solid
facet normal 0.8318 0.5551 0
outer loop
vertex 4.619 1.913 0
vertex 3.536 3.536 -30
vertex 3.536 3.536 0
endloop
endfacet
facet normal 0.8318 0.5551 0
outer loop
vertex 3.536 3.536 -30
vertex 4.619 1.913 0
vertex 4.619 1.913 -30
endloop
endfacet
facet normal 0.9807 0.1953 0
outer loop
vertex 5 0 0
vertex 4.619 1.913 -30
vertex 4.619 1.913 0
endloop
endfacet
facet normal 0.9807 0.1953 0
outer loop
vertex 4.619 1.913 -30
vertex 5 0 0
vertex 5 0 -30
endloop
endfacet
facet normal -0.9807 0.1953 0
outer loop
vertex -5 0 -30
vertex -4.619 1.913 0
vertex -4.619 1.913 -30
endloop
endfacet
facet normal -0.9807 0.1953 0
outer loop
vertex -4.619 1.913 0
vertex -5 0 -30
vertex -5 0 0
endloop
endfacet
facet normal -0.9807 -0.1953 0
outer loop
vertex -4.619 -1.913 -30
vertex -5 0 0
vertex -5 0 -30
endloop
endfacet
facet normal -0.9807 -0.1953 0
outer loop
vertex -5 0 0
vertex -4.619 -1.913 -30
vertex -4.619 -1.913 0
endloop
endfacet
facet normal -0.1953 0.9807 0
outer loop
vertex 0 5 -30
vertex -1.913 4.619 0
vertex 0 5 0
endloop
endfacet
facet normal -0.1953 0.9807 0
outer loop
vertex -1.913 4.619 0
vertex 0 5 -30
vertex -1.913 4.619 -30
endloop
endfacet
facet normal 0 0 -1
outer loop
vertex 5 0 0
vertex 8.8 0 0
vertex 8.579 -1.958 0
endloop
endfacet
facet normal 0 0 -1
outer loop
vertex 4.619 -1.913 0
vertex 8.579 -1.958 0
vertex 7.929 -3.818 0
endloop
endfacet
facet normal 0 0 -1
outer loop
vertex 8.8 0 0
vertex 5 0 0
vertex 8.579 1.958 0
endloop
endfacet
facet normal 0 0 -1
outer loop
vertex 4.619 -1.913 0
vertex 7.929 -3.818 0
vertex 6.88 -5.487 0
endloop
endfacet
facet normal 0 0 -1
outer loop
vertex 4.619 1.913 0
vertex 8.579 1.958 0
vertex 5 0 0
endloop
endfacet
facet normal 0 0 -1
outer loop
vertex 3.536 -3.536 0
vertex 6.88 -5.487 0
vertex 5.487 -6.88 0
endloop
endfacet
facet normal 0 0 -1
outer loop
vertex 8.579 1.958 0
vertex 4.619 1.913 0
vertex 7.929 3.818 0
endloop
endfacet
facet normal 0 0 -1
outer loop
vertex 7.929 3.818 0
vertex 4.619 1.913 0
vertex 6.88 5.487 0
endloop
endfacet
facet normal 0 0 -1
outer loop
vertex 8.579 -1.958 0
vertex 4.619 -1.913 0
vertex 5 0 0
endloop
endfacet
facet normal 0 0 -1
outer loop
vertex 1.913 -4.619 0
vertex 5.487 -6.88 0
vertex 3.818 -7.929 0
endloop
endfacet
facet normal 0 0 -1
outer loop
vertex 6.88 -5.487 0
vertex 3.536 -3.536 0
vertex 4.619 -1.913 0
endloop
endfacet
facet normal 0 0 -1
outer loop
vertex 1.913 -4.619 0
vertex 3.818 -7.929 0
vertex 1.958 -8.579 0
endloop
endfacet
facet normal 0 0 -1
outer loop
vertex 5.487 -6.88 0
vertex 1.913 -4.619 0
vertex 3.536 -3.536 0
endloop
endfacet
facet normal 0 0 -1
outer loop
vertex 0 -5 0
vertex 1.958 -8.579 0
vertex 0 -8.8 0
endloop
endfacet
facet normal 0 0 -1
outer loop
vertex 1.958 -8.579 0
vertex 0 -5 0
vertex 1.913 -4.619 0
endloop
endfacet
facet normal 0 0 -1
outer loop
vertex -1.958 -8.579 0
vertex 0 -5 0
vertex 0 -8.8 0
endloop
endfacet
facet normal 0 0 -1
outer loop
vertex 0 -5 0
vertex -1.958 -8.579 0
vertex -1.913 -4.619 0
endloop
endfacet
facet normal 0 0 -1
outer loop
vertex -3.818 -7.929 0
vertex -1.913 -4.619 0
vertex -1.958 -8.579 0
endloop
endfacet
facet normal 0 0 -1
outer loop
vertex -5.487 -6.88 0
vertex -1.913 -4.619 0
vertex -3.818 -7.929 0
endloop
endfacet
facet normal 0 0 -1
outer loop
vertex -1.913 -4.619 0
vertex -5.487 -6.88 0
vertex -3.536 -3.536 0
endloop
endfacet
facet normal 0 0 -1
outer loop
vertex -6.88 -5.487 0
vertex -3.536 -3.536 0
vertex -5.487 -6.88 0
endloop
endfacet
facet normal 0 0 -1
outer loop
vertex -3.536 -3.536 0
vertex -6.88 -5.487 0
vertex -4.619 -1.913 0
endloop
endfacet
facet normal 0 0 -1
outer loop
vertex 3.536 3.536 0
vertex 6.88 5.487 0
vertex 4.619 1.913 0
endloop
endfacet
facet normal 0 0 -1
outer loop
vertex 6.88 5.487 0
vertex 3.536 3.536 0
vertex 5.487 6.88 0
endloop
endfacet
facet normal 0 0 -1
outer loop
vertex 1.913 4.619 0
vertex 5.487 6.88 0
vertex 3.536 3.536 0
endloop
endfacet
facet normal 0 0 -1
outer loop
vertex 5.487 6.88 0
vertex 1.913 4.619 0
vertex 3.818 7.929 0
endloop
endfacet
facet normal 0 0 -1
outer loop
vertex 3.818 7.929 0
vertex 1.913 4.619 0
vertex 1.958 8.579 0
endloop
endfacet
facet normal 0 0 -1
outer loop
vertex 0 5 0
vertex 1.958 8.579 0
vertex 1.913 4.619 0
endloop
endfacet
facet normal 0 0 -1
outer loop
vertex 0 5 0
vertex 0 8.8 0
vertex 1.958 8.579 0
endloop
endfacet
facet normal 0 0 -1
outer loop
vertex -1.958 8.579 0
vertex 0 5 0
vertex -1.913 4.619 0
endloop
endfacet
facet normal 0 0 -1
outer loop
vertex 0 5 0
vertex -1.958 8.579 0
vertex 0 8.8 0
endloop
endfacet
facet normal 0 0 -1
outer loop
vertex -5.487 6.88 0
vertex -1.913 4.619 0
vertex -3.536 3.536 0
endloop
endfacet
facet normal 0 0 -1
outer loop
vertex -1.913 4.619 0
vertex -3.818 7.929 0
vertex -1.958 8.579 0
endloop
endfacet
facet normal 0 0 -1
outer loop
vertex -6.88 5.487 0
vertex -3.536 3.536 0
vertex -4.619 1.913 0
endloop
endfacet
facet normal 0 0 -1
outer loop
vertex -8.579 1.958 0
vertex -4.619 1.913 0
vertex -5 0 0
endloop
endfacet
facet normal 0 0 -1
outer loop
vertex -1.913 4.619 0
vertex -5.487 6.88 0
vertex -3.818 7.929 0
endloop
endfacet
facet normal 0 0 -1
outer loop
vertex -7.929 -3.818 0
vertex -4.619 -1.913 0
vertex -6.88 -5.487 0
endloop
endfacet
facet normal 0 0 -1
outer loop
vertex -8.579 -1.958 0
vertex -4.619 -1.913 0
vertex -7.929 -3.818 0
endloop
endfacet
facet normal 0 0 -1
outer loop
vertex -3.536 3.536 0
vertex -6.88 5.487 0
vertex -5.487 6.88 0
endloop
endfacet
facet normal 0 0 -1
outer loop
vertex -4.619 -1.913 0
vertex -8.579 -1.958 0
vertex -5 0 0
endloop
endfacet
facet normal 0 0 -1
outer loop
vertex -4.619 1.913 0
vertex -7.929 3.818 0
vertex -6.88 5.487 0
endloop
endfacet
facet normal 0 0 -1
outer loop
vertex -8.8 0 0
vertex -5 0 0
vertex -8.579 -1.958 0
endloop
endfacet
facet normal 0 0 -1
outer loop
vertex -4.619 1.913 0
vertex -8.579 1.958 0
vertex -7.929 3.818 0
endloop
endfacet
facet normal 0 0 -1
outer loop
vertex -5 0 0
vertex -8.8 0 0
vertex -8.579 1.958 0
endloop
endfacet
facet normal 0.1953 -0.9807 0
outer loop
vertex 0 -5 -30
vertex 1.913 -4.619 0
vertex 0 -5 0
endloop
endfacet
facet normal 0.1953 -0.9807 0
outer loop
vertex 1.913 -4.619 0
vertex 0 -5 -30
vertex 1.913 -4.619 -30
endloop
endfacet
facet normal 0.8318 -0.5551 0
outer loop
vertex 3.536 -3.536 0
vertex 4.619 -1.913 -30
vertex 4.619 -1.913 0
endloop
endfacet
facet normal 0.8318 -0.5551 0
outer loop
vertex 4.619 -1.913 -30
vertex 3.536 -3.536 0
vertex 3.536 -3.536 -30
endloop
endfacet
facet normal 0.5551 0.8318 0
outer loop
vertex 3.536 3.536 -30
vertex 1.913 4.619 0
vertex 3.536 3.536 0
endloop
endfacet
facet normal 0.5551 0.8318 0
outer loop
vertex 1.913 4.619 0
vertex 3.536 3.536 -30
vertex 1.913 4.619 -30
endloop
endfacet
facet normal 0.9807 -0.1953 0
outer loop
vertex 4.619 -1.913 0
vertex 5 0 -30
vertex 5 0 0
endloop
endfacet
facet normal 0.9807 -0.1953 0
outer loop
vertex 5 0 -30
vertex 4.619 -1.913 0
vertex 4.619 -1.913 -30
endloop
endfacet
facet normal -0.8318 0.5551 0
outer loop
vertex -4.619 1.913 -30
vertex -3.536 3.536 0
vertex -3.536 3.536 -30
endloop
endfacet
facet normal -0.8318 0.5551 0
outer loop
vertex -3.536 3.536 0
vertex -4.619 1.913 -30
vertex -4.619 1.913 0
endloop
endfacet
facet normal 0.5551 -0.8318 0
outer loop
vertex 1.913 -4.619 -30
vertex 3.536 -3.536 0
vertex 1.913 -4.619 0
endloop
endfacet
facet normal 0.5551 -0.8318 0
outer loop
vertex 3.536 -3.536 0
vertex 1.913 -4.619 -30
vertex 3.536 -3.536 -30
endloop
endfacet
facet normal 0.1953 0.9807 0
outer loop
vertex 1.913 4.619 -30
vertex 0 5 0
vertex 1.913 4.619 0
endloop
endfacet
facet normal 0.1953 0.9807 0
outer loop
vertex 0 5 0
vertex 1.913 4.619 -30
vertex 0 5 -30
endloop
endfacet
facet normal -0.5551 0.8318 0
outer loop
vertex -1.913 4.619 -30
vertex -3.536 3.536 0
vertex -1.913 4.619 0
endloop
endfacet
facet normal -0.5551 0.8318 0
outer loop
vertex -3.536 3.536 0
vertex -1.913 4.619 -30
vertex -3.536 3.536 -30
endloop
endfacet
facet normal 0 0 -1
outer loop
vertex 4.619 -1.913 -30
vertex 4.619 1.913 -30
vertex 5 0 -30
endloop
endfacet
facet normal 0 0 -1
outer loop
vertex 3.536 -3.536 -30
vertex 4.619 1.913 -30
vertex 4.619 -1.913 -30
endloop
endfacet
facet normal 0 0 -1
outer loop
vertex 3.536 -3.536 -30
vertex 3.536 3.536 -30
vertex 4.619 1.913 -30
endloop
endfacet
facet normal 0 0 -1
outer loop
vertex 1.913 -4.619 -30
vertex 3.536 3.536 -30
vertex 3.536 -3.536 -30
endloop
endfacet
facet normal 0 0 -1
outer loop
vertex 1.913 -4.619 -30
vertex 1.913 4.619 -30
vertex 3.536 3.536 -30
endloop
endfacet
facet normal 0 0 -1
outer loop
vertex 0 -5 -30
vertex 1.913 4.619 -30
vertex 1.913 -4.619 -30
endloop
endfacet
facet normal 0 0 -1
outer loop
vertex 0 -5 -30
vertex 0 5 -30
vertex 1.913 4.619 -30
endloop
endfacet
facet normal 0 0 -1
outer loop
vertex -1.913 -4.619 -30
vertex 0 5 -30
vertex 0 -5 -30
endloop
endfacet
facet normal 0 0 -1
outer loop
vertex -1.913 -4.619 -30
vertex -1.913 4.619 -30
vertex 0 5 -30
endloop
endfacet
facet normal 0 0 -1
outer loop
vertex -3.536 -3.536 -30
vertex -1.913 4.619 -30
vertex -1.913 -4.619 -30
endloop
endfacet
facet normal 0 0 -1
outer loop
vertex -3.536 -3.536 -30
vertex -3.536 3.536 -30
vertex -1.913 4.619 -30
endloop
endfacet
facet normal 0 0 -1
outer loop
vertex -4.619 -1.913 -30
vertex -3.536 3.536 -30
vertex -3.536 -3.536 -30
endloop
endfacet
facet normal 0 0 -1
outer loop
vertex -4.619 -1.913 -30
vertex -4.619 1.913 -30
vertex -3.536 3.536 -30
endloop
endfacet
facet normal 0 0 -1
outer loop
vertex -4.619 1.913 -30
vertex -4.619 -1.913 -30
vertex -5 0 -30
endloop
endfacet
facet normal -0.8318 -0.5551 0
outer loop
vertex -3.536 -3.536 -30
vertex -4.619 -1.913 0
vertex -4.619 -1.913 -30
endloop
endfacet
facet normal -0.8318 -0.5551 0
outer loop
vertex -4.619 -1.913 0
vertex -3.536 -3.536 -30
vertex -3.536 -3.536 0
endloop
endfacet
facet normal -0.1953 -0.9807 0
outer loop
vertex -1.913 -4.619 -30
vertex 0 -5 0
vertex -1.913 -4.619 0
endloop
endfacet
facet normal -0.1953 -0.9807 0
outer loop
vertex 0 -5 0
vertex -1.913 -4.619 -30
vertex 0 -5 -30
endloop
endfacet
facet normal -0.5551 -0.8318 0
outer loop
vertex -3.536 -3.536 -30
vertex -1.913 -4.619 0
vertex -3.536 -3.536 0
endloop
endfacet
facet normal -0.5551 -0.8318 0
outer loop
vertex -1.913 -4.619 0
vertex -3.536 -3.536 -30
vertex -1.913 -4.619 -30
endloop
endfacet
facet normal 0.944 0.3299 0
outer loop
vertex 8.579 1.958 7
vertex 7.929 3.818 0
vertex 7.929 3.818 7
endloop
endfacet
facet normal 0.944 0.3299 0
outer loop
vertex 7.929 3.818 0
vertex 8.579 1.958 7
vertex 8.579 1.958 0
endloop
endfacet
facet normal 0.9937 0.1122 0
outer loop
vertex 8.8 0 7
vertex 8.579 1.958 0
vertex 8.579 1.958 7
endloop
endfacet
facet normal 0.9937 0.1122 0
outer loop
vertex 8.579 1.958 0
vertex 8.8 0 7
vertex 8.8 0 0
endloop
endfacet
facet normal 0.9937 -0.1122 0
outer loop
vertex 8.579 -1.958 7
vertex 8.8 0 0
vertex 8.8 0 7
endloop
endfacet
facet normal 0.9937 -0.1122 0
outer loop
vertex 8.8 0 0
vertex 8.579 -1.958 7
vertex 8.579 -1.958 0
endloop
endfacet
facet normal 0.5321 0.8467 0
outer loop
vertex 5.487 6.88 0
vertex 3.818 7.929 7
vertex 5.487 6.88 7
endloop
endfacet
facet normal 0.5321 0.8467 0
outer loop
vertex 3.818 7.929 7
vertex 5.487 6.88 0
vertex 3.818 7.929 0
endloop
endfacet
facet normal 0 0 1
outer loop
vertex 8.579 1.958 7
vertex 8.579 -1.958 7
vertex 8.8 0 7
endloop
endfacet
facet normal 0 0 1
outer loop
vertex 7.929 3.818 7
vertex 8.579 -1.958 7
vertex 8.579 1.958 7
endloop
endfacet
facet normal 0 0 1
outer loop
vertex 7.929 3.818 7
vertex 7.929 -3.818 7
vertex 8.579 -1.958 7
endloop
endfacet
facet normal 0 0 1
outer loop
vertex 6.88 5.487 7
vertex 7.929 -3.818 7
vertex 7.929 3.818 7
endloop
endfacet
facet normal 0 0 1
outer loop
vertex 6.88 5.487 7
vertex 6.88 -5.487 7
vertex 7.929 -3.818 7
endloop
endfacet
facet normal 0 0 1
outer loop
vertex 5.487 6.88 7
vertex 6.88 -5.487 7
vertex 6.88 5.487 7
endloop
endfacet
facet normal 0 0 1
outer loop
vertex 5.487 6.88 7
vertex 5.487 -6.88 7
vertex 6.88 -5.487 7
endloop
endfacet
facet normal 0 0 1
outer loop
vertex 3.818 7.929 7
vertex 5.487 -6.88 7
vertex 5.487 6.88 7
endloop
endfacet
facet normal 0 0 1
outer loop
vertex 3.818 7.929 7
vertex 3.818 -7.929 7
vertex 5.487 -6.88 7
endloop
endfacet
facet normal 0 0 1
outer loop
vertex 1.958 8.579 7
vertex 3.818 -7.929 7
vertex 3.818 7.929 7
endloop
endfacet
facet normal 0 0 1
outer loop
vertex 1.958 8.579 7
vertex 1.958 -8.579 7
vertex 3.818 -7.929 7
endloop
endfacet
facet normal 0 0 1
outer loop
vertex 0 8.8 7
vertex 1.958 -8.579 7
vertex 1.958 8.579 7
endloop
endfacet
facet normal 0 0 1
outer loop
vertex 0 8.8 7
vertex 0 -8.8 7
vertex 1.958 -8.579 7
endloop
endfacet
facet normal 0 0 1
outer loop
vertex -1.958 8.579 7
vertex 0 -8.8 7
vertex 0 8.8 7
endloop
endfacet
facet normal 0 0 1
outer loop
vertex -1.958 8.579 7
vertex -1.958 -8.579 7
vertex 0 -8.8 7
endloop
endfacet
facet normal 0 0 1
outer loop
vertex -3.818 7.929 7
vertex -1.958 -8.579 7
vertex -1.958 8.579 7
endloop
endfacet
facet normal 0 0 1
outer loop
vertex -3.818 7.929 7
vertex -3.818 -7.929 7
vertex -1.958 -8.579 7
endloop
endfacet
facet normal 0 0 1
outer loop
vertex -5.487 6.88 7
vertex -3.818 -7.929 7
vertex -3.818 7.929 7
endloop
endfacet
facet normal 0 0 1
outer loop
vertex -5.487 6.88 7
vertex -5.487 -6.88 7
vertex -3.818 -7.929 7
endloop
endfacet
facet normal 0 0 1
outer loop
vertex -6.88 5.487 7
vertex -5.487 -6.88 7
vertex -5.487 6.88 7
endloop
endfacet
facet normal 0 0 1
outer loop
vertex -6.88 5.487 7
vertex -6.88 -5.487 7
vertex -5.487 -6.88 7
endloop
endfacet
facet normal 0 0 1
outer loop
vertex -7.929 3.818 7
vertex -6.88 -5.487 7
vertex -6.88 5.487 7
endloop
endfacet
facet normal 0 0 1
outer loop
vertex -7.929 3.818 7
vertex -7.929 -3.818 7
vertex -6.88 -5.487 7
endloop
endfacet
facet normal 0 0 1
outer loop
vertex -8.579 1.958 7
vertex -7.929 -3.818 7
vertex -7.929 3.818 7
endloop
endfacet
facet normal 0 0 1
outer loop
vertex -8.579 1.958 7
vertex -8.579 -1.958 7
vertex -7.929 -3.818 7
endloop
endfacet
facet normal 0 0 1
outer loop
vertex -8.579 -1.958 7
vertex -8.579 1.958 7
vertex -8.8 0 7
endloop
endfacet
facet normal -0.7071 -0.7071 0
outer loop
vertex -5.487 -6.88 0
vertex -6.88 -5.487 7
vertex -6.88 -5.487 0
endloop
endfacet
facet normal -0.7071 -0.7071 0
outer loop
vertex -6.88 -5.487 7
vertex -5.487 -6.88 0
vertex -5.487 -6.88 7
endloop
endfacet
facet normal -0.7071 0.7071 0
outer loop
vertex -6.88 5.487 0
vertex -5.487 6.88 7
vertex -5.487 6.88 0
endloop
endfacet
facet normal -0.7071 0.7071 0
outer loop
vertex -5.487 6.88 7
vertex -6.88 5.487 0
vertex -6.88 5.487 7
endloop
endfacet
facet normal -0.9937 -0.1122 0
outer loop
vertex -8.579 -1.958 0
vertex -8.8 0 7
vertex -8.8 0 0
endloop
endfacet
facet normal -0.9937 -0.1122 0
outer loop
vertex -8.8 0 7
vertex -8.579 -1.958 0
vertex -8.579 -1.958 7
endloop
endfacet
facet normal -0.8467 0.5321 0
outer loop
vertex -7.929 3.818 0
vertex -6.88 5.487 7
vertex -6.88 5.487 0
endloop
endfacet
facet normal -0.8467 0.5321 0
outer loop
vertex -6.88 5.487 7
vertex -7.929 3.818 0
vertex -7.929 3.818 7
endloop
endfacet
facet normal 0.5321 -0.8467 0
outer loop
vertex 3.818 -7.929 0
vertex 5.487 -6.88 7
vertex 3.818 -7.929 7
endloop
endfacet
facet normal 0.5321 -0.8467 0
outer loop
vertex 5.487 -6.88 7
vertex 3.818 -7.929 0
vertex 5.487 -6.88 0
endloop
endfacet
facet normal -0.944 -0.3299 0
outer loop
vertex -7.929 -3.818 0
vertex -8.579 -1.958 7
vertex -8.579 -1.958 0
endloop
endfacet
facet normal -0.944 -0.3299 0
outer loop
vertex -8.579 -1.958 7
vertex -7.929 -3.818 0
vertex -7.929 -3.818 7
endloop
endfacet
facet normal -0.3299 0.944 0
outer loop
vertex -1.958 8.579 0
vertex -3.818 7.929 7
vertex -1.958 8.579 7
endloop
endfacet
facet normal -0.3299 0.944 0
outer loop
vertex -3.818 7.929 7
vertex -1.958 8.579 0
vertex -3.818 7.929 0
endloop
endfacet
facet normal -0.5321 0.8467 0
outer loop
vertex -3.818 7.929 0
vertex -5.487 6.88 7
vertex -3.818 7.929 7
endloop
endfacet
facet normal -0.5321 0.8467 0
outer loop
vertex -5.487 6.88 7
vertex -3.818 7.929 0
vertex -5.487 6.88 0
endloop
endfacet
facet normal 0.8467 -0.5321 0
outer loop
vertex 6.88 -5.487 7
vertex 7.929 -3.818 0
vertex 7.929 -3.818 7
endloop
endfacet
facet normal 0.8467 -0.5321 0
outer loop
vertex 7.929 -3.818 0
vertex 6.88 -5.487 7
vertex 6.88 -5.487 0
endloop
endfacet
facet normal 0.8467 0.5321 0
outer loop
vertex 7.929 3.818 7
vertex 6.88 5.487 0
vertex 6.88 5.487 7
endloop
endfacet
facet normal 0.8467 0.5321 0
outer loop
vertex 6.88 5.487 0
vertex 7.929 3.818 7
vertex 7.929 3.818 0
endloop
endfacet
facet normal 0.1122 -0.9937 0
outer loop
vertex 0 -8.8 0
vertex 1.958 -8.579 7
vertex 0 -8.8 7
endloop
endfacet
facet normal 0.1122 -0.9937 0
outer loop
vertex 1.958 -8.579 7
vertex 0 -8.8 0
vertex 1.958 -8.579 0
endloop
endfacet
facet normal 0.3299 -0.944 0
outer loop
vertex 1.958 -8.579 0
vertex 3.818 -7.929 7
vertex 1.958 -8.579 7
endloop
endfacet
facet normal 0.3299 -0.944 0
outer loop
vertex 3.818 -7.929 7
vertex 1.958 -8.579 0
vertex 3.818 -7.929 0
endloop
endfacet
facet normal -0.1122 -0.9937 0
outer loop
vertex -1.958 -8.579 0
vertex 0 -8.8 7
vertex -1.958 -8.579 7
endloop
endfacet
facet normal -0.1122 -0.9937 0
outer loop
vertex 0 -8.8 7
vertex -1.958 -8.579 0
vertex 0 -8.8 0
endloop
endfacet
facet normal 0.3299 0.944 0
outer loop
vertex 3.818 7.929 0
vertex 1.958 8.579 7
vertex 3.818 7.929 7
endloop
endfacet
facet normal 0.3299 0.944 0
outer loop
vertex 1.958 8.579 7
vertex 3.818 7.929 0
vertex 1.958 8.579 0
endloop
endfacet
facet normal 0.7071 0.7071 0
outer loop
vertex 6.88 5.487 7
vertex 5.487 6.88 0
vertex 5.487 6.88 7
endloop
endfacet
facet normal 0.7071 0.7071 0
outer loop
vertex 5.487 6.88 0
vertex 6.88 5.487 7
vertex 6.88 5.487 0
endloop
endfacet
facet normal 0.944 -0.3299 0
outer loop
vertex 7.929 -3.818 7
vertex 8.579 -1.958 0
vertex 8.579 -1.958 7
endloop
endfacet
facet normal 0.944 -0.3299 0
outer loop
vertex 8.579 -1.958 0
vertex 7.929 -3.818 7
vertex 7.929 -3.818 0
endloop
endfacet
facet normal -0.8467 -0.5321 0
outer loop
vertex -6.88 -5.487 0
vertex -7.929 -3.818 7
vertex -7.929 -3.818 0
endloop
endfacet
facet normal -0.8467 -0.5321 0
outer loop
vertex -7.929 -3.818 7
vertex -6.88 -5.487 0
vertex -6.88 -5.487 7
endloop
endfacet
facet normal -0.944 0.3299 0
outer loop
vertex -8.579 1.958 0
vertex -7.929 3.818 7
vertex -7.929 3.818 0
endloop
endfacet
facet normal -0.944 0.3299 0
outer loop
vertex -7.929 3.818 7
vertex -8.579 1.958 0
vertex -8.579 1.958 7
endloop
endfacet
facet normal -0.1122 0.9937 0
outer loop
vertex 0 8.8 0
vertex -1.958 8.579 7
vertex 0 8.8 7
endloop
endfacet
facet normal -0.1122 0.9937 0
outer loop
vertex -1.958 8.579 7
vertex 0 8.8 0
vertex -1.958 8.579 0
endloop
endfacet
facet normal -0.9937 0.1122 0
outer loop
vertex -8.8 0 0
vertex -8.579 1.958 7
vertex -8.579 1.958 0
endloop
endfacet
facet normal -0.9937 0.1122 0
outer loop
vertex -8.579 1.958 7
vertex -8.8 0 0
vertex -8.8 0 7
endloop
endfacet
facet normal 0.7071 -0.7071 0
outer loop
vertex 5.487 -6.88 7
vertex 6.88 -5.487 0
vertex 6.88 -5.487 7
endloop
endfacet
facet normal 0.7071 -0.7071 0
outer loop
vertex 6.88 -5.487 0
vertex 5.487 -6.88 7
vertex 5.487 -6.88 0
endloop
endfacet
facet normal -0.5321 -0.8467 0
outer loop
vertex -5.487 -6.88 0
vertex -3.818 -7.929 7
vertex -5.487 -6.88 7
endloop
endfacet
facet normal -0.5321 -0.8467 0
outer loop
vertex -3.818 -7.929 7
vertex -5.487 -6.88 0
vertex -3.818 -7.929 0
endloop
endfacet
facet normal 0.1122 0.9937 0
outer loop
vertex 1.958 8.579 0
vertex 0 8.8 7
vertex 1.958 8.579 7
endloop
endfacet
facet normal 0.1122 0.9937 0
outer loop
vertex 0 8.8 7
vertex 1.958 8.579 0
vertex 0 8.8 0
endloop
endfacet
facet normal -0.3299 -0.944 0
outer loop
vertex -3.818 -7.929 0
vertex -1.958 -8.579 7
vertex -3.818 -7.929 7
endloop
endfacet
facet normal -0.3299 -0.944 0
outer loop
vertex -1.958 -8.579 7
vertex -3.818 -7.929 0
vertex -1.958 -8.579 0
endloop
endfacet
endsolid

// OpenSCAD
module screw_7798(type, length) {

    d = [6,8,10,12,16,20,24,30,36,42,48];
    k = [4,5.5,7,8,10,13,15,19,23,25,30];
    e = [10.9,14.2,17.6,19.9,26.2,33,39.6,50.9,60.8,71.3,82.6];

    union() {

        translate([0, 0, -length])
            cylinder(h=length, r=d[type]/2);

        cylinder(h=k[type], r=e[type]/2);
        
    } // union
}

screw_7798(2, 30);
